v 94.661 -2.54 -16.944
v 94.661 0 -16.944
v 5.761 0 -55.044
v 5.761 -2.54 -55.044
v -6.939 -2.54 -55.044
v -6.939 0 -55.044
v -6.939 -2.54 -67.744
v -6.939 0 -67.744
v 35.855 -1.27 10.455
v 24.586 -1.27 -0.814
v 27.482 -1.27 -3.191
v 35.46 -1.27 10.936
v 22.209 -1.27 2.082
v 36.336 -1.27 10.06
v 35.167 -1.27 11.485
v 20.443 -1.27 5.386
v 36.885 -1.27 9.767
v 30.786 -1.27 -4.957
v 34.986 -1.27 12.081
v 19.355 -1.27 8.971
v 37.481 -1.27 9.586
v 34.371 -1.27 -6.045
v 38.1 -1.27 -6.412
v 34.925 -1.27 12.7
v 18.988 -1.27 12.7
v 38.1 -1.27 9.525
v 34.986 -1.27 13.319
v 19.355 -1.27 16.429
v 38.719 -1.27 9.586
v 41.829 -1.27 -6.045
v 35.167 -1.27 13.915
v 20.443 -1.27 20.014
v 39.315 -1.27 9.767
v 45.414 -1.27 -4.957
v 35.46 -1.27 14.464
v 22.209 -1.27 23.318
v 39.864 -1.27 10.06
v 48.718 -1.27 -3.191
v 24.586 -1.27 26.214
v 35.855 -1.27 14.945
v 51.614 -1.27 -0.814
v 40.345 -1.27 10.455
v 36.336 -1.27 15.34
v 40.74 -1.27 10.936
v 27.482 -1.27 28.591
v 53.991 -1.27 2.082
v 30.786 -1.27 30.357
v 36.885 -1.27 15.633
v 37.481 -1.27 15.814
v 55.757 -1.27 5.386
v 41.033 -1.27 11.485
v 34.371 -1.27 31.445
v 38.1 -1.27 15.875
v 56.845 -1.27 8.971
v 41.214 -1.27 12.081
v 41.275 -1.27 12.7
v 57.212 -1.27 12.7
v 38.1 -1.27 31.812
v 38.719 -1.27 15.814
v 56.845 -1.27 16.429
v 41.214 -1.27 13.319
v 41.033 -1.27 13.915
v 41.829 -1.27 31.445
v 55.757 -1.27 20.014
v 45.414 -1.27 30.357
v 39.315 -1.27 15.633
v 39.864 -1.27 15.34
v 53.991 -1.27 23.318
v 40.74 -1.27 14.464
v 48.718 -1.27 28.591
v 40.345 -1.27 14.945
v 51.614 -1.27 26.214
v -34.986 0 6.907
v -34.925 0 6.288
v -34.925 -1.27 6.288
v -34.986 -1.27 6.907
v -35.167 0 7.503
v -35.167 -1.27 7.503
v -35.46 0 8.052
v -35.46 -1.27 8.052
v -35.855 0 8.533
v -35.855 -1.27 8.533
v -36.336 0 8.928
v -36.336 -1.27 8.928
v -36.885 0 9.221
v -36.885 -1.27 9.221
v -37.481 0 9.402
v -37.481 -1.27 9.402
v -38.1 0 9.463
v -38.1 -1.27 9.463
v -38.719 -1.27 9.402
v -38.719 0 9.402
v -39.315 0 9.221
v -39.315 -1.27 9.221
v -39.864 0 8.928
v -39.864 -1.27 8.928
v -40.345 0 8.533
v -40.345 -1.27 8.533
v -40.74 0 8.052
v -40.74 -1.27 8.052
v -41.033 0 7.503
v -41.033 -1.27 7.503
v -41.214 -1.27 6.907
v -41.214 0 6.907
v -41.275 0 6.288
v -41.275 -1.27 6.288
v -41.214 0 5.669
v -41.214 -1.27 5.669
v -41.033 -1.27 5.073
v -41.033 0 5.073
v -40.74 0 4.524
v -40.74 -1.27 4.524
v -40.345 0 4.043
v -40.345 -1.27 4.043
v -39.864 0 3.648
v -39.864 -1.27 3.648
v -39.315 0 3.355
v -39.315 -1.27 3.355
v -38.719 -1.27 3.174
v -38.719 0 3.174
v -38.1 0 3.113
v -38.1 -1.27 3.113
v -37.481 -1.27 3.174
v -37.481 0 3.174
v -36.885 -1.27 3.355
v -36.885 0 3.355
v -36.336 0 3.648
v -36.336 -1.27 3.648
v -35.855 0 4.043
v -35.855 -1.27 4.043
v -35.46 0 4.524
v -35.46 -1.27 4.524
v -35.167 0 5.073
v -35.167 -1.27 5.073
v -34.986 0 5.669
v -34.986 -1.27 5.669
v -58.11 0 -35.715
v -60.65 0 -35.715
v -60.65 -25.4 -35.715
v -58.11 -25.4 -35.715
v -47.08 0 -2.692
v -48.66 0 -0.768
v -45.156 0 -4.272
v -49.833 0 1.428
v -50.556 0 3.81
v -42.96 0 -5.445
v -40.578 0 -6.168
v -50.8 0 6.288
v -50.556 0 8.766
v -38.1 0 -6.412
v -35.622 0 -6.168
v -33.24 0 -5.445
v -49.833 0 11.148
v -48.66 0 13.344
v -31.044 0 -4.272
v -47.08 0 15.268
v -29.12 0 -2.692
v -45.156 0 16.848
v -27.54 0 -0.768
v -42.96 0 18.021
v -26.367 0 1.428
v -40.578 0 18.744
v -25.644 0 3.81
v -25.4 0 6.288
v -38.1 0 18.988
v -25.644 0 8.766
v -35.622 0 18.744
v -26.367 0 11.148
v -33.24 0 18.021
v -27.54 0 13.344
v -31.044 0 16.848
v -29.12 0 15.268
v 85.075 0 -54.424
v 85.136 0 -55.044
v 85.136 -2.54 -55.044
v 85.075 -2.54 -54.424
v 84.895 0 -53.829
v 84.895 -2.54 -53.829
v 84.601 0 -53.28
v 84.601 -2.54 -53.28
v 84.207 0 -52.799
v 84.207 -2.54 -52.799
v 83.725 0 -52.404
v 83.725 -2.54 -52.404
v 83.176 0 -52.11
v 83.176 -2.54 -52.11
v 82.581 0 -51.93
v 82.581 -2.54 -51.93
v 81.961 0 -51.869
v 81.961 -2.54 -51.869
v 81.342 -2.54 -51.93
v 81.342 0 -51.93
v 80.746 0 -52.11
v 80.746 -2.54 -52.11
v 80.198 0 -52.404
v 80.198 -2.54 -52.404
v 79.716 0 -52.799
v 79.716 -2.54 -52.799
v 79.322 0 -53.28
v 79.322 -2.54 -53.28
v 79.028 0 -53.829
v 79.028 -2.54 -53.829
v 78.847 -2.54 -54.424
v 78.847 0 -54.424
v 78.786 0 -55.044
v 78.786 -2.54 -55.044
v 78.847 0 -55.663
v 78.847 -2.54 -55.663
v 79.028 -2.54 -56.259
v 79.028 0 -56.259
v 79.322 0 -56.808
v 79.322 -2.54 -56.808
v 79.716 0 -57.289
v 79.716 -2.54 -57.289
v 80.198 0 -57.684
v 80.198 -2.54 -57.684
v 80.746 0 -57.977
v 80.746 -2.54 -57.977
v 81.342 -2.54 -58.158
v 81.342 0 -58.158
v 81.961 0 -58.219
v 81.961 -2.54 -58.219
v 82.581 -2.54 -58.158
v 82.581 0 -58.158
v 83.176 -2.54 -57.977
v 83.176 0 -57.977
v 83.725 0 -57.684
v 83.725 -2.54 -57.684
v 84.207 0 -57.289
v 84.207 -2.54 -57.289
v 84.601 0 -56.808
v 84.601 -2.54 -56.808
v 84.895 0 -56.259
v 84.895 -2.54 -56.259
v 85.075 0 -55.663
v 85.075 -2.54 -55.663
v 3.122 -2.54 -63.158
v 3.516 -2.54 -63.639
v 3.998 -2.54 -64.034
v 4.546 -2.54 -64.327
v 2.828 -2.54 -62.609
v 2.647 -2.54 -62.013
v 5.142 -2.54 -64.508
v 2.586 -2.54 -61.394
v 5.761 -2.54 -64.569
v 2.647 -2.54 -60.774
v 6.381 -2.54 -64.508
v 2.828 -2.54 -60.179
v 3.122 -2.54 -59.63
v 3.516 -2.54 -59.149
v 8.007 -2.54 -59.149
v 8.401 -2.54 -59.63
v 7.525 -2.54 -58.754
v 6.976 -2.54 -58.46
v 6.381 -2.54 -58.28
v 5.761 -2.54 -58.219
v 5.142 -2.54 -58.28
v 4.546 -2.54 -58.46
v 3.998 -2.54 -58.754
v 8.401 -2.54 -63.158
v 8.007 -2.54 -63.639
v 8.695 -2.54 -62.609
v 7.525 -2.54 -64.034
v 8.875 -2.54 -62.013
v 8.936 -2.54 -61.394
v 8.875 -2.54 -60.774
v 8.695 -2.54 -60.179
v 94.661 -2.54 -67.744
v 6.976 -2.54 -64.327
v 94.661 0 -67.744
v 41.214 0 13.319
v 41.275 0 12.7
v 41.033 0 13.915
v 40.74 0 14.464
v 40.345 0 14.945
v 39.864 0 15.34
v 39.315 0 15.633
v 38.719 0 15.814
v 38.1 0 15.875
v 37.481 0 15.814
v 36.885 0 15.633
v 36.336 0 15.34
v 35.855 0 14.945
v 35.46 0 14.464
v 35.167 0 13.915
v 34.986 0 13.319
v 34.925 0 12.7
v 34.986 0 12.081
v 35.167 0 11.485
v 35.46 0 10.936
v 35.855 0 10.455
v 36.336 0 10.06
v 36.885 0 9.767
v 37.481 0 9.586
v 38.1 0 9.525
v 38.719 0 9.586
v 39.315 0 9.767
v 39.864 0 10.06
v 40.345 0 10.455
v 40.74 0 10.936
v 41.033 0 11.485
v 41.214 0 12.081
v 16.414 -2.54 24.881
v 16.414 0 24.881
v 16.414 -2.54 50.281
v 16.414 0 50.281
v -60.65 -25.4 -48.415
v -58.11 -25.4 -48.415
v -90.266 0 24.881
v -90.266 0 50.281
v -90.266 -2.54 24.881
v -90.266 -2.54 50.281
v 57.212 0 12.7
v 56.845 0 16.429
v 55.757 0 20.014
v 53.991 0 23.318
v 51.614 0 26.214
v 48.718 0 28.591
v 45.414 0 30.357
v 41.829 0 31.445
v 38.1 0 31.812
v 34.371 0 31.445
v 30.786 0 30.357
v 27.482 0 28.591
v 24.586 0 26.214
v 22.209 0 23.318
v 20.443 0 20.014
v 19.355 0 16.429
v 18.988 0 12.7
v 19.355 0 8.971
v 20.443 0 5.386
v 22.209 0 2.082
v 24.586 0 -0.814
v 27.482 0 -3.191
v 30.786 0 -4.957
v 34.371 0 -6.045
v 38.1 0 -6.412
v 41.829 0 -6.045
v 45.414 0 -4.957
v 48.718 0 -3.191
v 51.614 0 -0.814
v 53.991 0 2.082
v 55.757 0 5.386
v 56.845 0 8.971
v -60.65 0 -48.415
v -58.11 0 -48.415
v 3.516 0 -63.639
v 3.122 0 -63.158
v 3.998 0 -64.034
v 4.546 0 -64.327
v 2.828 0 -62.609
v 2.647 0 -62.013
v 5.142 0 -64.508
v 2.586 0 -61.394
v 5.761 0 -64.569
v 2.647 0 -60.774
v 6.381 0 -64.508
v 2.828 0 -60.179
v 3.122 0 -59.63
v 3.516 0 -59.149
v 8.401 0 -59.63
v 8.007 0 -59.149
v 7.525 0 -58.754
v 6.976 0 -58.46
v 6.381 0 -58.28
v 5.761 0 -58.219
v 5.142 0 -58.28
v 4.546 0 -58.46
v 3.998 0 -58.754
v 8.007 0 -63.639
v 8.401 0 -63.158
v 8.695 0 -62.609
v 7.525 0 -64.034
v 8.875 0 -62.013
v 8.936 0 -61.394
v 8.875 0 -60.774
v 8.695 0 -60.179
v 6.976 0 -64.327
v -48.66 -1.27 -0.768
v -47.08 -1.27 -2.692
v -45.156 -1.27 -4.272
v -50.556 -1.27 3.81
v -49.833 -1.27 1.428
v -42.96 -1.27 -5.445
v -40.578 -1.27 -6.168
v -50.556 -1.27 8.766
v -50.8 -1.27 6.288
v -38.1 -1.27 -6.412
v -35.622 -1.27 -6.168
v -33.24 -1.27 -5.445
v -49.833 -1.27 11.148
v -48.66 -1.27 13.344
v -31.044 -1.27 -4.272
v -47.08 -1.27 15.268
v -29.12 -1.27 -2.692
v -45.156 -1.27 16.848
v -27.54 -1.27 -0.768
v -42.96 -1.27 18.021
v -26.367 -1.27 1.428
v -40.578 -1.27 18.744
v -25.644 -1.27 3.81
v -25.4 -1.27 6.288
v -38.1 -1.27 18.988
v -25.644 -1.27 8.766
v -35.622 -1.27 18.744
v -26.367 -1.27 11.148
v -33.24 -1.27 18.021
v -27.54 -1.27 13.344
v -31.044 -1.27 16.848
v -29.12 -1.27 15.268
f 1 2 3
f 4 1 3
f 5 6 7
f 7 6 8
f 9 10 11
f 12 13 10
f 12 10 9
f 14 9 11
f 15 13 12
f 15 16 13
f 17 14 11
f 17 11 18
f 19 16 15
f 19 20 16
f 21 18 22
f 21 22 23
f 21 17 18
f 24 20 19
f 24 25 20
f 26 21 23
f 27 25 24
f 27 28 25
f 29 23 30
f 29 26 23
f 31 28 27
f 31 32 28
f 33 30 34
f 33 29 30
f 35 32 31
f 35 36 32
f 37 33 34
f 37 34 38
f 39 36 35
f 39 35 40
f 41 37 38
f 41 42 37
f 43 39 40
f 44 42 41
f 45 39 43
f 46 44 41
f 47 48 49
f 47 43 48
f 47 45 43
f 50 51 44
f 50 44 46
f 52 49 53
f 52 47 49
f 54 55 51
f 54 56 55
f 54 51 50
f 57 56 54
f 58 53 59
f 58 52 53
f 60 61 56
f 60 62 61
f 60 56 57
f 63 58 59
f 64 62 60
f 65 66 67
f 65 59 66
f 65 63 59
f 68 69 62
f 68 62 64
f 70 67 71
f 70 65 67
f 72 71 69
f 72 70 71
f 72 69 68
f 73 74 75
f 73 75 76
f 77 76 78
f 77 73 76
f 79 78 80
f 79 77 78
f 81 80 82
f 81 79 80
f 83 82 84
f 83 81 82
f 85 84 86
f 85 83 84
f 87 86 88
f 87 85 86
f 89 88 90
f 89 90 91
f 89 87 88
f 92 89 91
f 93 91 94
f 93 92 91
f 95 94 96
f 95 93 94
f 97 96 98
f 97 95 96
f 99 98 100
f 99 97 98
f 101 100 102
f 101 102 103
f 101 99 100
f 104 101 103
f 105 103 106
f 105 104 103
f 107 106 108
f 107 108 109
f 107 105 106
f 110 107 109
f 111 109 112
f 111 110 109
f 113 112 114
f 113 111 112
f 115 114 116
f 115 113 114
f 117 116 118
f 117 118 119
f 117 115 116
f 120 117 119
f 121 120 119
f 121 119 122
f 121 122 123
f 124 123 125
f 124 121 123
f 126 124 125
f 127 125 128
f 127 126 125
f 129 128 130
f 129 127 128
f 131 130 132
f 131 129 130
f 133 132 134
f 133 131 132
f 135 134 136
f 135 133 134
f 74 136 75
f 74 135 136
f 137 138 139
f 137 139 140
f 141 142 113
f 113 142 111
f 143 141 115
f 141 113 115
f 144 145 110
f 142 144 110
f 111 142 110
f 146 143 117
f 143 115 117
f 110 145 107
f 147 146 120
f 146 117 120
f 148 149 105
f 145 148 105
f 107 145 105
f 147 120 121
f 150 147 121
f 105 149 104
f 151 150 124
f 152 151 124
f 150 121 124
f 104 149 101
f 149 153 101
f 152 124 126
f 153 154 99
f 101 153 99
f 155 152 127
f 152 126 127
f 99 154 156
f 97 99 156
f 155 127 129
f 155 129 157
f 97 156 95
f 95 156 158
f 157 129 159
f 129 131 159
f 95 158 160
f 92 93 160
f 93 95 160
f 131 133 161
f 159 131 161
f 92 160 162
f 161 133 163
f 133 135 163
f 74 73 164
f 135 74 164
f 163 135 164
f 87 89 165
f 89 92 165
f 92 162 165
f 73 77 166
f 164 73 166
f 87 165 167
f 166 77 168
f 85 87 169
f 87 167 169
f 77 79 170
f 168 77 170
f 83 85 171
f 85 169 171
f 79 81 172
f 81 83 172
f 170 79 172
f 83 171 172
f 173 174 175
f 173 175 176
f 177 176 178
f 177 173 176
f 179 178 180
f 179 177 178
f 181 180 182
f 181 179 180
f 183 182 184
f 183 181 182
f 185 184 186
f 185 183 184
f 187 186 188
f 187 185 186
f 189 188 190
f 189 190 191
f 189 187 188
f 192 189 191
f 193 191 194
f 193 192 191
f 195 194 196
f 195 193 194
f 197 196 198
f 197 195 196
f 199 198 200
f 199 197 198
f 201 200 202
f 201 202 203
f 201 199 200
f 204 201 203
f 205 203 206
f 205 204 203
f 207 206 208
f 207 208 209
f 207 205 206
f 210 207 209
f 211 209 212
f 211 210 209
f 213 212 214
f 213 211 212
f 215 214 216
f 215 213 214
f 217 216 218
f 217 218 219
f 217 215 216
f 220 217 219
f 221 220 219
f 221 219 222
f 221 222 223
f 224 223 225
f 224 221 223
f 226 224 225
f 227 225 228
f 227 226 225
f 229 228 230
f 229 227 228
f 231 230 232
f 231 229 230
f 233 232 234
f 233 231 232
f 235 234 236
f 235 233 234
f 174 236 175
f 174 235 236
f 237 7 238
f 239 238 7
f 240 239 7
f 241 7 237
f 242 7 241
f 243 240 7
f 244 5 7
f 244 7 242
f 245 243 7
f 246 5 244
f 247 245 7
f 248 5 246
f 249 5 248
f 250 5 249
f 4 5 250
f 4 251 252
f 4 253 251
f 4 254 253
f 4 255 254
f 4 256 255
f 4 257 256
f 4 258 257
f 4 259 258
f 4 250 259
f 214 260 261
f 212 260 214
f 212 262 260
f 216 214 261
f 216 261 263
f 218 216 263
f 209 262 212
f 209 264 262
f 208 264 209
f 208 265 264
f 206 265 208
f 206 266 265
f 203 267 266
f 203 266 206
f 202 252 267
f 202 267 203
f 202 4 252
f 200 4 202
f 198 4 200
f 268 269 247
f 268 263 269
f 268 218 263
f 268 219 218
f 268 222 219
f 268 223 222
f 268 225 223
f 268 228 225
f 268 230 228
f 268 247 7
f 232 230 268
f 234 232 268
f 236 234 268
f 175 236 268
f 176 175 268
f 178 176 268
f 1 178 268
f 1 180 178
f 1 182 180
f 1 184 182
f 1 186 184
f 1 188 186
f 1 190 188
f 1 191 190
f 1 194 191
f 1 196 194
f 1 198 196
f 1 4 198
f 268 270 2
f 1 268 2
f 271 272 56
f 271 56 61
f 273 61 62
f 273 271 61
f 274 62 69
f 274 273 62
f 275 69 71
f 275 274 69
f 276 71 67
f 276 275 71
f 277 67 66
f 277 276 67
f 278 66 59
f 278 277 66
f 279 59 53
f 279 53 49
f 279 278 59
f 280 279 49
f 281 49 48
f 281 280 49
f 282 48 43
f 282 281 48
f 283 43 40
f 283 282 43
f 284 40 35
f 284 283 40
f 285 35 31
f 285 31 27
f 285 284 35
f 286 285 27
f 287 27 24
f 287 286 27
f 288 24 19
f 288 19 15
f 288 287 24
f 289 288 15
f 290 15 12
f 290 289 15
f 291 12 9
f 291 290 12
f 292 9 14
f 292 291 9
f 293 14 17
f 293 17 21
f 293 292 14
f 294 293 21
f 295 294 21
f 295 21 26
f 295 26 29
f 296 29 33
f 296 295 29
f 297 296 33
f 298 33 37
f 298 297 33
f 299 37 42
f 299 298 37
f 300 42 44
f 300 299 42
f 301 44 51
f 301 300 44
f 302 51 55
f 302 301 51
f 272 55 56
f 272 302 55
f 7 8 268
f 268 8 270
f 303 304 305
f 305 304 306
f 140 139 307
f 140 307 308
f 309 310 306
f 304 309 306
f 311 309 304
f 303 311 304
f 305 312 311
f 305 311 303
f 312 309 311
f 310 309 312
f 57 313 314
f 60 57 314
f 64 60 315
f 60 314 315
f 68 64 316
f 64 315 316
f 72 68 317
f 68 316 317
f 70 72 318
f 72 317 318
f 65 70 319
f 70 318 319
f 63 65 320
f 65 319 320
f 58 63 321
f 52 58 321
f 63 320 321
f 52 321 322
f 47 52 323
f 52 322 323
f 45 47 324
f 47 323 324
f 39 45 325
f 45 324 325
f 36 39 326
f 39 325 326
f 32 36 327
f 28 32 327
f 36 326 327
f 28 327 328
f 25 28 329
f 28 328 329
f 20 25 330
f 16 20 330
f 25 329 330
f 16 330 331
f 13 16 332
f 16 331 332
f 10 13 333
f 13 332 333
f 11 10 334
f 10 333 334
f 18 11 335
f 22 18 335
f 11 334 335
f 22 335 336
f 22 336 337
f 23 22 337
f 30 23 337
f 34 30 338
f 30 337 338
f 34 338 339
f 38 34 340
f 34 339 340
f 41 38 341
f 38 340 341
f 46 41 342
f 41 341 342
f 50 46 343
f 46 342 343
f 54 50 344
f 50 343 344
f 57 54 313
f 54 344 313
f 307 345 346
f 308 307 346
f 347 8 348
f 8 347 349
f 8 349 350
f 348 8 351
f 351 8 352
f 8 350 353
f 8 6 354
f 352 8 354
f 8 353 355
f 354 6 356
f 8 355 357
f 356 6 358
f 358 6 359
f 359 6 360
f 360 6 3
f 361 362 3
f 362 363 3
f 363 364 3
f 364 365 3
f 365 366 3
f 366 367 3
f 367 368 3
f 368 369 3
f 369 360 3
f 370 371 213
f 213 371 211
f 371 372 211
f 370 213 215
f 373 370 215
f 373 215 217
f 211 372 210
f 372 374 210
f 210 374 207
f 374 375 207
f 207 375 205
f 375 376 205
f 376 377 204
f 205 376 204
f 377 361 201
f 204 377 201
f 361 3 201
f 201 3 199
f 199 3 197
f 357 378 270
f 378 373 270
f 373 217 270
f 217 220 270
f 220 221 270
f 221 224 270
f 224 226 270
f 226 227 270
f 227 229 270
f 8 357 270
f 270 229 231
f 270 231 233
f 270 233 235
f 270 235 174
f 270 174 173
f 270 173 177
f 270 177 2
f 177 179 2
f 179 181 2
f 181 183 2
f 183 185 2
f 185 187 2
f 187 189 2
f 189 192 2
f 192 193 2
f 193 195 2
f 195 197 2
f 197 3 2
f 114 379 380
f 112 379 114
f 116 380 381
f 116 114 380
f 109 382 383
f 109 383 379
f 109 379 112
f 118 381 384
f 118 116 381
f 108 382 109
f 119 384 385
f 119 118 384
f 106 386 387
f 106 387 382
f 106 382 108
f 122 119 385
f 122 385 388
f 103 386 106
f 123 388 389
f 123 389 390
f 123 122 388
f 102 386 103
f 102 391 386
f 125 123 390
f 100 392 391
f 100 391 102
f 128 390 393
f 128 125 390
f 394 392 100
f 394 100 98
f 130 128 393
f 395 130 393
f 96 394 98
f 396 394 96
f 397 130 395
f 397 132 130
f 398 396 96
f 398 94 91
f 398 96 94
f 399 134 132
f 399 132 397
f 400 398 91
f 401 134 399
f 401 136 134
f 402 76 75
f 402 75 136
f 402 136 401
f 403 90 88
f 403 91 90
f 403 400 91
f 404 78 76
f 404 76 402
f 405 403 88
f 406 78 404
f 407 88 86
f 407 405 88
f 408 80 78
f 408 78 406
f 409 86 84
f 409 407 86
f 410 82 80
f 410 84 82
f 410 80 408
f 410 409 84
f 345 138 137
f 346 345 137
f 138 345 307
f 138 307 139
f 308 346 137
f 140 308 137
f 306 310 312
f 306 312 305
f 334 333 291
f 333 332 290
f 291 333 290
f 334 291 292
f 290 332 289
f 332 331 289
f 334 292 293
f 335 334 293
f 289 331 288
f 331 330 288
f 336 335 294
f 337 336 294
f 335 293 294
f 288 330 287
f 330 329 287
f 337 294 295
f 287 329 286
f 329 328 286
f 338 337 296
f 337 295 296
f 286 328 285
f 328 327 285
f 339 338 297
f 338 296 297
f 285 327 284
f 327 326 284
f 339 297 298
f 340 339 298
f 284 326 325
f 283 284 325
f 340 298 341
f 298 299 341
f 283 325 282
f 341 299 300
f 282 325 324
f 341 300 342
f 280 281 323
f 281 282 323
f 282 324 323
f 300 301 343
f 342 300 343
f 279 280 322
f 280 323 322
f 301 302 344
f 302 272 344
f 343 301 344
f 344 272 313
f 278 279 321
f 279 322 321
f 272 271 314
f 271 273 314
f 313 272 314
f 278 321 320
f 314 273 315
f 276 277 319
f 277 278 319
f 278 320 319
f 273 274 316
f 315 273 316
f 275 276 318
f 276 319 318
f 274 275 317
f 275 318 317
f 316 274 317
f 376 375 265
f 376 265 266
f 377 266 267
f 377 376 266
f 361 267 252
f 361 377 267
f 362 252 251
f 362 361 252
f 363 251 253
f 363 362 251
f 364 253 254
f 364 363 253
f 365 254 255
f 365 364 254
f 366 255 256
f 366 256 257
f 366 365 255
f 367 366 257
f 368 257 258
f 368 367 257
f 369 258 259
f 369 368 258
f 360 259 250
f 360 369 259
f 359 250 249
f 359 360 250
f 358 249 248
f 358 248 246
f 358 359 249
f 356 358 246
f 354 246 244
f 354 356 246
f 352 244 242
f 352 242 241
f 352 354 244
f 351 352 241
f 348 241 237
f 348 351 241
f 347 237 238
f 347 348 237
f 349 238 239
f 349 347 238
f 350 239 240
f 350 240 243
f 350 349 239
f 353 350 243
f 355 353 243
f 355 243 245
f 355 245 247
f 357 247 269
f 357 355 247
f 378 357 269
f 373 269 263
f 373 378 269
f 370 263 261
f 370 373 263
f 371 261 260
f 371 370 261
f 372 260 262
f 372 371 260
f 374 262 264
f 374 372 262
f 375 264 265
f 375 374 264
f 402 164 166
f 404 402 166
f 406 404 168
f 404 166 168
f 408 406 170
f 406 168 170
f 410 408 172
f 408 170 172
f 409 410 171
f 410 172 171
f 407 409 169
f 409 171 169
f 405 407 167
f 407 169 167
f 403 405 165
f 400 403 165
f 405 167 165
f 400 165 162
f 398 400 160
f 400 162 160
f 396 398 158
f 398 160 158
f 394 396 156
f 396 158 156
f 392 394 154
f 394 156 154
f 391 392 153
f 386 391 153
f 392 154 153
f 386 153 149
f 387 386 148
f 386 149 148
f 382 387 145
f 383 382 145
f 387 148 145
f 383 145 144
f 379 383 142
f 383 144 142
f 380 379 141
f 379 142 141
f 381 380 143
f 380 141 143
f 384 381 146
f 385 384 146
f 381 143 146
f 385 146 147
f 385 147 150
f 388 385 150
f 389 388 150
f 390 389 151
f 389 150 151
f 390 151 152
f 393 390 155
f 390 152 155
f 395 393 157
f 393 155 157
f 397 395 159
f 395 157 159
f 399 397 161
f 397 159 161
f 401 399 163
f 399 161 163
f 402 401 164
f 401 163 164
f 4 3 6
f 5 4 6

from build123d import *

# Parameters (mm, degrees)
F0_R     = 12.7
F0_R_2   = 3.175
F0_R_3   = 19.111952
F1_DEPTH = 1.27
F2_DEPTH = 2.54
F0_W     = 2.54
F0_H     = 12.7
F3_DEPTH = 25.4
F0_W_2   = 106.68
F0_H_2   = 25.4
F4_DEPTH = 2.54


with BuildPart() as f1:
    # F0 (on Front) → F1 (new body)
    with BuildSketch(Plane.XZ):
        with Locations((-38.1, 6.288048)):
            Circle(F0_R)
        with Locations((-38.1, 6.288048)):
            Circle(F0_R_2, mode=Mode.SUBTRACT)
        with Locations((38.1, 12.7)):
            Circle(F0_R_3)
        with Locations((38.1, 12.7)):
            Circle(F0_R_2, mode=Mode.SUBTRACT)
    extrude(amount=F1_DEPTH)


with BuildPart() as f2:
    # F0 (on Front) → F2 (new body)
    with BuildSketch(Plane.XZ):
        Polygon((-6.938536, -67.743659), (43.861464, -67.743659), (94.661464, -67.743659), (94.661464, -16.943659), (5.761464, -55.043659), (-6.938536, -55.043659), align=None)
        with Locations((5.761464, -61.393659)):
            Circle(F0_R_2, mode=Mode.SUBTRACT)
        with Locations((81.961438, -55.043659)):
            Circle(F0_R_2, mode=Mode.SUBTRACT)
    extrude(amount=F2_DEPTH)


with BuildPart() as f3:
    # F0 (on Front) → F3 (new body)
    with BuildSketch(Plane.XZ):
        with Locations((-59.380241, -42.064879)):
            Rectangle(F0_W, F0_H)
    extrude(amount=F3_DEPTH)


with BuildPart() as f4:
    # F0 (on Front) → F4 (new body)
    with BuildSketch(Plane.XZ):
        with Locations((-36.92552, 37.58061)):
            Rectangle(F0_W_2, F0_H_2)
    extrude(amount=F4_DEPTH)


solid = Compound([f1.part, f2.part, f3.part, f4.part])
